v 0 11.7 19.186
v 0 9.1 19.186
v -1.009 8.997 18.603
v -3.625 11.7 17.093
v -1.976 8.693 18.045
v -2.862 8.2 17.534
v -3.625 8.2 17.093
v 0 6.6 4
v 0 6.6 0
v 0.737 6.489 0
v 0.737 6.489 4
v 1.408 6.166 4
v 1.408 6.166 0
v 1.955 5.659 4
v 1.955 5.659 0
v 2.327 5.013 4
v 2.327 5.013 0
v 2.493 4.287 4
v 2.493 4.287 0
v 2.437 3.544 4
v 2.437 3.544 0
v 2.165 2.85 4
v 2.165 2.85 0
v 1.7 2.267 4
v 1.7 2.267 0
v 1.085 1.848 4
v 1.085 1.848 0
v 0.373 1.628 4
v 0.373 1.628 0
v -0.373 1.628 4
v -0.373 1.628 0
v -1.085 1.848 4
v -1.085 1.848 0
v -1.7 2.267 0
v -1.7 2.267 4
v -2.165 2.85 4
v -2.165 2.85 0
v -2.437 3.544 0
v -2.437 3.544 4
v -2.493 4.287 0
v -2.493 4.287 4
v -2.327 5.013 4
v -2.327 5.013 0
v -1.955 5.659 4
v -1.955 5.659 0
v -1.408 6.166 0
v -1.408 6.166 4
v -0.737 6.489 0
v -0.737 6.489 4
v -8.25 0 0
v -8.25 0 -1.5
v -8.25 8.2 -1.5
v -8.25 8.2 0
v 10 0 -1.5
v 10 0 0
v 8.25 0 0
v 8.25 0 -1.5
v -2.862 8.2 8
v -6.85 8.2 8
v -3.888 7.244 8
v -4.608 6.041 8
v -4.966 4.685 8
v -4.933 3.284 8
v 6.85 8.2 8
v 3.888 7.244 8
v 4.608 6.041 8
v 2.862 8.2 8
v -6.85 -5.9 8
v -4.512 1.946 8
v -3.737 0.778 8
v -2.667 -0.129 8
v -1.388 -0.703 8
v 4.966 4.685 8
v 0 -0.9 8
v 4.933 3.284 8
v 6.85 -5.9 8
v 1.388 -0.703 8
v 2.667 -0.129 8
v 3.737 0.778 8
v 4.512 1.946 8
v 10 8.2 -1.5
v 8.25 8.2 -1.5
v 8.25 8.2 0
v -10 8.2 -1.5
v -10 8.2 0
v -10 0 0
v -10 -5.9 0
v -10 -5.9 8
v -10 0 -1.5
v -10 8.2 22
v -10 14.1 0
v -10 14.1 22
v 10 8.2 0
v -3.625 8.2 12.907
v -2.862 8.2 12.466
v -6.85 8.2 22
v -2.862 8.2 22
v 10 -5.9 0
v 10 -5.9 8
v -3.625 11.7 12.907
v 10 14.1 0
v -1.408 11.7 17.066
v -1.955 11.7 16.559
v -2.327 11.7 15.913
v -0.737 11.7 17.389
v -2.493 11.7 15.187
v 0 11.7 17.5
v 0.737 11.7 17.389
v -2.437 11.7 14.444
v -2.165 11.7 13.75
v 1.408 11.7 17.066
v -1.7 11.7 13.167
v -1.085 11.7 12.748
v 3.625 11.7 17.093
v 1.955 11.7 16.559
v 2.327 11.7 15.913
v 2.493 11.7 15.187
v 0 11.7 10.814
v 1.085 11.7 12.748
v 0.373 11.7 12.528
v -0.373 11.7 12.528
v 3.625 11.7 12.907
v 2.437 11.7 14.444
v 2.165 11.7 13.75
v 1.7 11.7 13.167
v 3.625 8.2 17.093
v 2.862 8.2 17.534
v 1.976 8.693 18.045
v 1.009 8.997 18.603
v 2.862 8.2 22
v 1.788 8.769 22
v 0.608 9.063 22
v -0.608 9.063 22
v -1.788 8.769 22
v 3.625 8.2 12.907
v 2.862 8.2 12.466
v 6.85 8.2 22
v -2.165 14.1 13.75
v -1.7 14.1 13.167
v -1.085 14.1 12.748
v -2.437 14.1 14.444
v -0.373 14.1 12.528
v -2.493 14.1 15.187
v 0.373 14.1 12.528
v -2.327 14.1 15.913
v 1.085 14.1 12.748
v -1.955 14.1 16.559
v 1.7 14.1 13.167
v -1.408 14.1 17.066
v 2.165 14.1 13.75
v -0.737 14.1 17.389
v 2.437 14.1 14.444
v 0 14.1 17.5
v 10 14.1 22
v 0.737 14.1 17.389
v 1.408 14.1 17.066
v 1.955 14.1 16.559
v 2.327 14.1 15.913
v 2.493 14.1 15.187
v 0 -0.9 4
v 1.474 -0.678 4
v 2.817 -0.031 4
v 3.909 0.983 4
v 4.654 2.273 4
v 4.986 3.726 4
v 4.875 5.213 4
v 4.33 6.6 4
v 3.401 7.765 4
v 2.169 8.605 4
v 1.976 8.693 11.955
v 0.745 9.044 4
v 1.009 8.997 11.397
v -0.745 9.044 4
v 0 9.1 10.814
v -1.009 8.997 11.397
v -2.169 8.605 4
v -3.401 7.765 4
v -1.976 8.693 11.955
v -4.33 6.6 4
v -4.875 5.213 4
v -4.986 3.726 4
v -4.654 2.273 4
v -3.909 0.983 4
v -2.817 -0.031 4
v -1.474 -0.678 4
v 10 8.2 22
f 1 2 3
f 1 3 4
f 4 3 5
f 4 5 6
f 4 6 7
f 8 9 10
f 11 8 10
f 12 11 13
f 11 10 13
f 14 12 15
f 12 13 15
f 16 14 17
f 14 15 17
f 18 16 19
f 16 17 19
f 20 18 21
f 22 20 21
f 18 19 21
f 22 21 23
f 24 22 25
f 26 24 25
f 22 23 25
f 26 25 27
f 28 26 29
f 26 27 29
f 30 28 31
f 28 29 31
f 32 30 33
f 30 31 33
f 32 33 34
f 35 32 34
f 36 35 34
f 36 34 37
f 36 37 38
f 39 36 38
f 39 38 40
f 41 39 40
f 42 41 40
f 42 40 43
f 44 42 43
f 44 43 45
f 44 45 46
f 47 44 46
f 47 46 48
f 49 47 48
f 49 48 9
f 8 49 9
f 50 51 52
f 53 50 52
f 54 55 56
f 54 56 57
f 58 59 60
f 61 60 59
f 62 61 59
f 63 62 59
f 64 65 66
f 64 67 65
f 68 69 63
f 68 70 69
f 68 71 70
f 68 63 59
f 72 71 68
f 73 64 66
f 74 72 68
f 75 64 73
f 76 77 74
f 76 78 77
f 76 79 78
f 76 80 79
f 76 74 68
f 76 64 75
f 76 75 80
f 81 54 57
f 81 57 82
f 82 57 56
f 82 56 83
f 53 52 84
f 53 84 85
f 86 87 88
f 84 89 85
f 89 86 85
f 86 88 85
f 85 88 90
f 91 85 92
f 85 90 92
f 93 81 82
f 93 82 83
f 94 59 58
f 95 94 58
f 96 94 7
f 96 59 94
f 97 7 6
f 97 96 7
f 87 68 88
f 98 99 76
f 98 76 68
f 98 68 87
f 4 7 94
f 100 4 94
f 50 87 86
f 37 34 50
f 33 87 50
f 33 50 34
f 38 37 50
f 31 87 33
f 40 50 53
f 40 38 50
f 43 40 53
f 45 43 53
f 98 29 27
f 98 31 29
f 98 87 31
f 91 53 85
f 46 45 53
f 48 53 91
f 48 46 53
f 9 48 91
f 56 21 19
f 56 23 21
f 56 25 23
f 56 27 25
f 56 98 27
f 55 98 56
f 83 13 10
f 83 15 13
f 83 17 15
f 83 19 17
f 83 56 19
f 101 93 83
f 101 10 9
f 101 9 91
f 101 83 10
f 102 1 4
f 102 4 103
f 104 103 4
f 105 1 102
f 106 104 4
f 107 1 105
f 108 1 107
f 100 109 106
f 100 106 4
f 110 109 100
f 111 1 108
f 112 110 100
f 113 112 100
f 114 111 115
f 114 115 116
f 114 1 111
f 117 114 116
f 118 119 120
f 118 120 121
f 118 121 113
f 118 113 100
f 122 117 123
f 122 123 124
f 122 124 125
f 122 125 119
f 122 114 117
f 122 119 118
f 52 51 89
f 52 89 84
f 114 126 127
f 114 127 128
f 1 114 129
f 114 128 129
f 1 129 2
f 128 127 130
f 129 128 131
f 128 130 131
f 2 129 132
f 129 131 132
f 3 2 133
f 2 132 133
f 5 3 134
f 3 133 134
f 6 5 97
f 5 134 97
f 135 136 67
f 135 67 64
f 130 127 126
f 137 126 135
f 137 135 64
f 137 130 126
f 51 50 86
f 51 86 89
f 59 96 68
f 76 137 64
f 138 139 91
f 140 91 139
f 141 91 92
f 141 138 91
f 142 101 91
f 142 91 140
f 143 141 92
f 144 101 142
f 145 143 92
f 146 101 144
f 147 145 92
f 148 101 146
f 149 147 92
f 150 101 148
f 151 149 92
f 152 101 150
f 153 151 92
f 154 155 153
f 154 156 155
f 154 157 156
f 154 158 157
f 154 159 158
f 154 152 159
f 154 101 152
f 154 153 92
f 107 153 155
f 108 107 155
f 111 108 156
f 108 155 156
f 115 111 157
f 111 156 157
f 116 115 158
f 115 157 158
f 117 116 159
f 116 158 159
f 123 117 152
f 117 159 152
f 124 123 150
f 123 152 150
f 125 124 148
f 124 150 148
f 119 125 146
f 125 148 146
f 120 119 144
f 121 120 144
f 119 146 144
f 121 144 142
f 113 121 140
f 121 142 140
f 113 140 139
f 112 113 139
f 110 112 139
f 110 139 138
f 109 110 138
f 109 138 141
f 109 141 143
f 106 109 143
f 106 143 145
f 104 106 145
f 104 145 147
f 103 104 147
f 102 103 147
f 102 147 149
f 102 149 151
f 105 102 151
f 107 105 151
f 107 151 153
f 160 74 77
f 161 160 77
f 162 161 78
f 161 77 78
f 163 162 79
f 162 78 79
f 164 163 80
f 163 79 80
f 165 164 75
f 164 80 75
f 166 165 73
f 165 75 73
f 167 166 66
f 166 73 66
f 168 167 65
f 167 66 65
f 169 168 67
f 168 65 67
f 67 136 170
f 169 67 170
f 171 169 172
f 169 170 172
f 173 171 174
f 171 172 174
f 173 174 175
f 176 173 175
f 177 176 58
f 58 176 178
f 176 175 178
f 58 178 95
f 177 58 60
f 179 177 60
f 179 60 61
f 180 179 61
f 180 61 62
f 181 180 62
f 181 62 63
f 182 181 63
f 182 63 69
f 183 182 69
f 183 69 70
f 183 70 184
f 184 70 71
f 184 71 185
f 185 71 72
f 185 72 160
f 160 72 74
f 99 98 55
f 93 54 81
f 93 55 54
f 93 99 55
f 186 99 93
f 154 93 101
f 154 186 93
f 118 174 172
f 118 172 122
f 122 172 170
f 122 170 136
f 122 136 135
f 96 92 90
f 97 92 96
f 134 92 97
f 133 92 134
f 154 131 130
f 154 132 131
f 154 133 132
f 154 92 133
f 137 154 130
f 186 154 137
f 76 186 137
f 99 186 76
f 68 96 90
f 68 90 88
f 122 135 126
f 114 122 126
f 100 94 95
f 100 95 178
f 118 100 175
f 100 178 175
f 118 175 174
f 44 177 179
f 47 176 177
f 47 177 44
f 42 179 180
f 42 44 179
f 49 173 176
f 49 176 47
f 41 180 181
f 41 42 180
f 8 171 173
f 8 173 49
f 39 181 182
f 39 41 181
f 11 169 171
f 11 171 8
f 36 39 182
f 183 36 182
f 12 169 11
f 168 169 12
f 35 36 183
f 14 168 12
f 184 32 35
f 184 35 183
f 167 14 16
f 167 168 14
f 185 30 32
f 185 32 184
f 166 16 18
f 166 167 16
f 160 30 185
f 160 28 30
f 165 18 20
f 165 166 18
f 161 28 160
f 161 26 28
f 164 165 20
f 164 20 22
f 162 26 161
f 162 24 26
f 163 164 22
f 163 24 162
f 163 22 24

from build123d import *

# Parameters (mm, degrees)
PAD_DEPTH       = 10
SKETCH001_W     = 14.1
SKETCH001_H     = 13.7
POCKET_DEPTH    = 14
SKETCH002_R     = 2.5
POCKET001_DEPTH = 23.501
SKETCH003_W     = 8.2
SKETCH003_H     = 16.5
POCKET002_DEPTH = 1.5
SKETCH004_R     = 2.5
POCKET003_DEPTH = 20.001
SKETCH005_R     = 5
POCKET004_DEPTH = 18
POCKET005_DEPTH = 3.5


with BuildPart() as part:
    # Sketch → Pad (new body, symmetric)
    with BuildSketch(Plane.YZ):
        Polygon((0, -1.5), (8.2, -1.5), (8.2, 0), (14.1, 0), (14.1, 22), (8.2, 22), (-5.9, 8), (-5.9, 0), (0, 0), align=None)
    extrude(amount=PAD_DEPTH, both=True)

    # Sketch001 (on Face8 of Pad) → Pocket (cut)
    with BuildSketch(Plane(origin=(0, 0, 22), x_dir=(0, -1, 0), z_dir=(0, 0, 1))):
        with Locations((-1.15, 0)):
            Rectangle(SKETCH001_W, SKETCH001_H)
    extrude(amount=-POCKET_DEPTH, mode=Mode.SUBTRACT)

    # Sketch002 (on Face11 of Pocket) → Pocket001 (cut, through all)
    with BuildSketch(Plane.YX.offset(1.5)):
        with Locations((4.1, 0)):
            Circle(SKETCH002_R)
    extrude(amount=-POCKET001_DEPTH, mode=Mode.SUBTRACT)

    # Sketch003 (on Face11 of Pocket001) → Pocket002 (cut)
    with BuildSketch(Plane.YX.offset(1.5)):
        with Locations((4.1, 0)):
            Rectangle(SKETCH003_W, SKETCH003_H)
    extrude(amount=-POCKET002_DEPTH, mode=Mode.SUBTRACT)

    # Sketch004 (on Face14 of Pocket002) → Pocket003 (cut, through all)
    with BuildSketch(Plane.ZX.offset(14.1)):
        with Locations((15, 0)):
            Circle(SKETCH004_R)
    extrude(amount=-POCKET003_DEPTH, mode=Mode.SUBTRACT)

    # Sketch005 (on Face8 of Pocket003) → Pocket004 (cut)
    with BuildSketch(Plane(origin=(0, 0, 22), x_dir=(0, -1, 0), z_dir=(0, 0, 1))):
        with Locations((-4.1, 0)):
            Circle(SKETCH005_R)
    extrude(amount=-POCKET004_DEPTH, mode=Mode.SUBTRACT)

    # Sketch006 (on Face17 of Pocket004) → Pocket005 (cut)
    with BuildSketch(Plane(origin=(0, 8.2, 0), x_dir=(0, 0, -1), z_dir=(0, -1, 0))):
        Polygon((-10.814211, 0), (-12.907105, 3.625), (-17.092895, 3.625), (-19.185789, 0), (-17.092895, -3.625), (-12.907105, -3.625), align=None)
    extrude(amount=-POCKET005_DEPTH, mode=Mode.SUBTRACT)


solid = part.part
